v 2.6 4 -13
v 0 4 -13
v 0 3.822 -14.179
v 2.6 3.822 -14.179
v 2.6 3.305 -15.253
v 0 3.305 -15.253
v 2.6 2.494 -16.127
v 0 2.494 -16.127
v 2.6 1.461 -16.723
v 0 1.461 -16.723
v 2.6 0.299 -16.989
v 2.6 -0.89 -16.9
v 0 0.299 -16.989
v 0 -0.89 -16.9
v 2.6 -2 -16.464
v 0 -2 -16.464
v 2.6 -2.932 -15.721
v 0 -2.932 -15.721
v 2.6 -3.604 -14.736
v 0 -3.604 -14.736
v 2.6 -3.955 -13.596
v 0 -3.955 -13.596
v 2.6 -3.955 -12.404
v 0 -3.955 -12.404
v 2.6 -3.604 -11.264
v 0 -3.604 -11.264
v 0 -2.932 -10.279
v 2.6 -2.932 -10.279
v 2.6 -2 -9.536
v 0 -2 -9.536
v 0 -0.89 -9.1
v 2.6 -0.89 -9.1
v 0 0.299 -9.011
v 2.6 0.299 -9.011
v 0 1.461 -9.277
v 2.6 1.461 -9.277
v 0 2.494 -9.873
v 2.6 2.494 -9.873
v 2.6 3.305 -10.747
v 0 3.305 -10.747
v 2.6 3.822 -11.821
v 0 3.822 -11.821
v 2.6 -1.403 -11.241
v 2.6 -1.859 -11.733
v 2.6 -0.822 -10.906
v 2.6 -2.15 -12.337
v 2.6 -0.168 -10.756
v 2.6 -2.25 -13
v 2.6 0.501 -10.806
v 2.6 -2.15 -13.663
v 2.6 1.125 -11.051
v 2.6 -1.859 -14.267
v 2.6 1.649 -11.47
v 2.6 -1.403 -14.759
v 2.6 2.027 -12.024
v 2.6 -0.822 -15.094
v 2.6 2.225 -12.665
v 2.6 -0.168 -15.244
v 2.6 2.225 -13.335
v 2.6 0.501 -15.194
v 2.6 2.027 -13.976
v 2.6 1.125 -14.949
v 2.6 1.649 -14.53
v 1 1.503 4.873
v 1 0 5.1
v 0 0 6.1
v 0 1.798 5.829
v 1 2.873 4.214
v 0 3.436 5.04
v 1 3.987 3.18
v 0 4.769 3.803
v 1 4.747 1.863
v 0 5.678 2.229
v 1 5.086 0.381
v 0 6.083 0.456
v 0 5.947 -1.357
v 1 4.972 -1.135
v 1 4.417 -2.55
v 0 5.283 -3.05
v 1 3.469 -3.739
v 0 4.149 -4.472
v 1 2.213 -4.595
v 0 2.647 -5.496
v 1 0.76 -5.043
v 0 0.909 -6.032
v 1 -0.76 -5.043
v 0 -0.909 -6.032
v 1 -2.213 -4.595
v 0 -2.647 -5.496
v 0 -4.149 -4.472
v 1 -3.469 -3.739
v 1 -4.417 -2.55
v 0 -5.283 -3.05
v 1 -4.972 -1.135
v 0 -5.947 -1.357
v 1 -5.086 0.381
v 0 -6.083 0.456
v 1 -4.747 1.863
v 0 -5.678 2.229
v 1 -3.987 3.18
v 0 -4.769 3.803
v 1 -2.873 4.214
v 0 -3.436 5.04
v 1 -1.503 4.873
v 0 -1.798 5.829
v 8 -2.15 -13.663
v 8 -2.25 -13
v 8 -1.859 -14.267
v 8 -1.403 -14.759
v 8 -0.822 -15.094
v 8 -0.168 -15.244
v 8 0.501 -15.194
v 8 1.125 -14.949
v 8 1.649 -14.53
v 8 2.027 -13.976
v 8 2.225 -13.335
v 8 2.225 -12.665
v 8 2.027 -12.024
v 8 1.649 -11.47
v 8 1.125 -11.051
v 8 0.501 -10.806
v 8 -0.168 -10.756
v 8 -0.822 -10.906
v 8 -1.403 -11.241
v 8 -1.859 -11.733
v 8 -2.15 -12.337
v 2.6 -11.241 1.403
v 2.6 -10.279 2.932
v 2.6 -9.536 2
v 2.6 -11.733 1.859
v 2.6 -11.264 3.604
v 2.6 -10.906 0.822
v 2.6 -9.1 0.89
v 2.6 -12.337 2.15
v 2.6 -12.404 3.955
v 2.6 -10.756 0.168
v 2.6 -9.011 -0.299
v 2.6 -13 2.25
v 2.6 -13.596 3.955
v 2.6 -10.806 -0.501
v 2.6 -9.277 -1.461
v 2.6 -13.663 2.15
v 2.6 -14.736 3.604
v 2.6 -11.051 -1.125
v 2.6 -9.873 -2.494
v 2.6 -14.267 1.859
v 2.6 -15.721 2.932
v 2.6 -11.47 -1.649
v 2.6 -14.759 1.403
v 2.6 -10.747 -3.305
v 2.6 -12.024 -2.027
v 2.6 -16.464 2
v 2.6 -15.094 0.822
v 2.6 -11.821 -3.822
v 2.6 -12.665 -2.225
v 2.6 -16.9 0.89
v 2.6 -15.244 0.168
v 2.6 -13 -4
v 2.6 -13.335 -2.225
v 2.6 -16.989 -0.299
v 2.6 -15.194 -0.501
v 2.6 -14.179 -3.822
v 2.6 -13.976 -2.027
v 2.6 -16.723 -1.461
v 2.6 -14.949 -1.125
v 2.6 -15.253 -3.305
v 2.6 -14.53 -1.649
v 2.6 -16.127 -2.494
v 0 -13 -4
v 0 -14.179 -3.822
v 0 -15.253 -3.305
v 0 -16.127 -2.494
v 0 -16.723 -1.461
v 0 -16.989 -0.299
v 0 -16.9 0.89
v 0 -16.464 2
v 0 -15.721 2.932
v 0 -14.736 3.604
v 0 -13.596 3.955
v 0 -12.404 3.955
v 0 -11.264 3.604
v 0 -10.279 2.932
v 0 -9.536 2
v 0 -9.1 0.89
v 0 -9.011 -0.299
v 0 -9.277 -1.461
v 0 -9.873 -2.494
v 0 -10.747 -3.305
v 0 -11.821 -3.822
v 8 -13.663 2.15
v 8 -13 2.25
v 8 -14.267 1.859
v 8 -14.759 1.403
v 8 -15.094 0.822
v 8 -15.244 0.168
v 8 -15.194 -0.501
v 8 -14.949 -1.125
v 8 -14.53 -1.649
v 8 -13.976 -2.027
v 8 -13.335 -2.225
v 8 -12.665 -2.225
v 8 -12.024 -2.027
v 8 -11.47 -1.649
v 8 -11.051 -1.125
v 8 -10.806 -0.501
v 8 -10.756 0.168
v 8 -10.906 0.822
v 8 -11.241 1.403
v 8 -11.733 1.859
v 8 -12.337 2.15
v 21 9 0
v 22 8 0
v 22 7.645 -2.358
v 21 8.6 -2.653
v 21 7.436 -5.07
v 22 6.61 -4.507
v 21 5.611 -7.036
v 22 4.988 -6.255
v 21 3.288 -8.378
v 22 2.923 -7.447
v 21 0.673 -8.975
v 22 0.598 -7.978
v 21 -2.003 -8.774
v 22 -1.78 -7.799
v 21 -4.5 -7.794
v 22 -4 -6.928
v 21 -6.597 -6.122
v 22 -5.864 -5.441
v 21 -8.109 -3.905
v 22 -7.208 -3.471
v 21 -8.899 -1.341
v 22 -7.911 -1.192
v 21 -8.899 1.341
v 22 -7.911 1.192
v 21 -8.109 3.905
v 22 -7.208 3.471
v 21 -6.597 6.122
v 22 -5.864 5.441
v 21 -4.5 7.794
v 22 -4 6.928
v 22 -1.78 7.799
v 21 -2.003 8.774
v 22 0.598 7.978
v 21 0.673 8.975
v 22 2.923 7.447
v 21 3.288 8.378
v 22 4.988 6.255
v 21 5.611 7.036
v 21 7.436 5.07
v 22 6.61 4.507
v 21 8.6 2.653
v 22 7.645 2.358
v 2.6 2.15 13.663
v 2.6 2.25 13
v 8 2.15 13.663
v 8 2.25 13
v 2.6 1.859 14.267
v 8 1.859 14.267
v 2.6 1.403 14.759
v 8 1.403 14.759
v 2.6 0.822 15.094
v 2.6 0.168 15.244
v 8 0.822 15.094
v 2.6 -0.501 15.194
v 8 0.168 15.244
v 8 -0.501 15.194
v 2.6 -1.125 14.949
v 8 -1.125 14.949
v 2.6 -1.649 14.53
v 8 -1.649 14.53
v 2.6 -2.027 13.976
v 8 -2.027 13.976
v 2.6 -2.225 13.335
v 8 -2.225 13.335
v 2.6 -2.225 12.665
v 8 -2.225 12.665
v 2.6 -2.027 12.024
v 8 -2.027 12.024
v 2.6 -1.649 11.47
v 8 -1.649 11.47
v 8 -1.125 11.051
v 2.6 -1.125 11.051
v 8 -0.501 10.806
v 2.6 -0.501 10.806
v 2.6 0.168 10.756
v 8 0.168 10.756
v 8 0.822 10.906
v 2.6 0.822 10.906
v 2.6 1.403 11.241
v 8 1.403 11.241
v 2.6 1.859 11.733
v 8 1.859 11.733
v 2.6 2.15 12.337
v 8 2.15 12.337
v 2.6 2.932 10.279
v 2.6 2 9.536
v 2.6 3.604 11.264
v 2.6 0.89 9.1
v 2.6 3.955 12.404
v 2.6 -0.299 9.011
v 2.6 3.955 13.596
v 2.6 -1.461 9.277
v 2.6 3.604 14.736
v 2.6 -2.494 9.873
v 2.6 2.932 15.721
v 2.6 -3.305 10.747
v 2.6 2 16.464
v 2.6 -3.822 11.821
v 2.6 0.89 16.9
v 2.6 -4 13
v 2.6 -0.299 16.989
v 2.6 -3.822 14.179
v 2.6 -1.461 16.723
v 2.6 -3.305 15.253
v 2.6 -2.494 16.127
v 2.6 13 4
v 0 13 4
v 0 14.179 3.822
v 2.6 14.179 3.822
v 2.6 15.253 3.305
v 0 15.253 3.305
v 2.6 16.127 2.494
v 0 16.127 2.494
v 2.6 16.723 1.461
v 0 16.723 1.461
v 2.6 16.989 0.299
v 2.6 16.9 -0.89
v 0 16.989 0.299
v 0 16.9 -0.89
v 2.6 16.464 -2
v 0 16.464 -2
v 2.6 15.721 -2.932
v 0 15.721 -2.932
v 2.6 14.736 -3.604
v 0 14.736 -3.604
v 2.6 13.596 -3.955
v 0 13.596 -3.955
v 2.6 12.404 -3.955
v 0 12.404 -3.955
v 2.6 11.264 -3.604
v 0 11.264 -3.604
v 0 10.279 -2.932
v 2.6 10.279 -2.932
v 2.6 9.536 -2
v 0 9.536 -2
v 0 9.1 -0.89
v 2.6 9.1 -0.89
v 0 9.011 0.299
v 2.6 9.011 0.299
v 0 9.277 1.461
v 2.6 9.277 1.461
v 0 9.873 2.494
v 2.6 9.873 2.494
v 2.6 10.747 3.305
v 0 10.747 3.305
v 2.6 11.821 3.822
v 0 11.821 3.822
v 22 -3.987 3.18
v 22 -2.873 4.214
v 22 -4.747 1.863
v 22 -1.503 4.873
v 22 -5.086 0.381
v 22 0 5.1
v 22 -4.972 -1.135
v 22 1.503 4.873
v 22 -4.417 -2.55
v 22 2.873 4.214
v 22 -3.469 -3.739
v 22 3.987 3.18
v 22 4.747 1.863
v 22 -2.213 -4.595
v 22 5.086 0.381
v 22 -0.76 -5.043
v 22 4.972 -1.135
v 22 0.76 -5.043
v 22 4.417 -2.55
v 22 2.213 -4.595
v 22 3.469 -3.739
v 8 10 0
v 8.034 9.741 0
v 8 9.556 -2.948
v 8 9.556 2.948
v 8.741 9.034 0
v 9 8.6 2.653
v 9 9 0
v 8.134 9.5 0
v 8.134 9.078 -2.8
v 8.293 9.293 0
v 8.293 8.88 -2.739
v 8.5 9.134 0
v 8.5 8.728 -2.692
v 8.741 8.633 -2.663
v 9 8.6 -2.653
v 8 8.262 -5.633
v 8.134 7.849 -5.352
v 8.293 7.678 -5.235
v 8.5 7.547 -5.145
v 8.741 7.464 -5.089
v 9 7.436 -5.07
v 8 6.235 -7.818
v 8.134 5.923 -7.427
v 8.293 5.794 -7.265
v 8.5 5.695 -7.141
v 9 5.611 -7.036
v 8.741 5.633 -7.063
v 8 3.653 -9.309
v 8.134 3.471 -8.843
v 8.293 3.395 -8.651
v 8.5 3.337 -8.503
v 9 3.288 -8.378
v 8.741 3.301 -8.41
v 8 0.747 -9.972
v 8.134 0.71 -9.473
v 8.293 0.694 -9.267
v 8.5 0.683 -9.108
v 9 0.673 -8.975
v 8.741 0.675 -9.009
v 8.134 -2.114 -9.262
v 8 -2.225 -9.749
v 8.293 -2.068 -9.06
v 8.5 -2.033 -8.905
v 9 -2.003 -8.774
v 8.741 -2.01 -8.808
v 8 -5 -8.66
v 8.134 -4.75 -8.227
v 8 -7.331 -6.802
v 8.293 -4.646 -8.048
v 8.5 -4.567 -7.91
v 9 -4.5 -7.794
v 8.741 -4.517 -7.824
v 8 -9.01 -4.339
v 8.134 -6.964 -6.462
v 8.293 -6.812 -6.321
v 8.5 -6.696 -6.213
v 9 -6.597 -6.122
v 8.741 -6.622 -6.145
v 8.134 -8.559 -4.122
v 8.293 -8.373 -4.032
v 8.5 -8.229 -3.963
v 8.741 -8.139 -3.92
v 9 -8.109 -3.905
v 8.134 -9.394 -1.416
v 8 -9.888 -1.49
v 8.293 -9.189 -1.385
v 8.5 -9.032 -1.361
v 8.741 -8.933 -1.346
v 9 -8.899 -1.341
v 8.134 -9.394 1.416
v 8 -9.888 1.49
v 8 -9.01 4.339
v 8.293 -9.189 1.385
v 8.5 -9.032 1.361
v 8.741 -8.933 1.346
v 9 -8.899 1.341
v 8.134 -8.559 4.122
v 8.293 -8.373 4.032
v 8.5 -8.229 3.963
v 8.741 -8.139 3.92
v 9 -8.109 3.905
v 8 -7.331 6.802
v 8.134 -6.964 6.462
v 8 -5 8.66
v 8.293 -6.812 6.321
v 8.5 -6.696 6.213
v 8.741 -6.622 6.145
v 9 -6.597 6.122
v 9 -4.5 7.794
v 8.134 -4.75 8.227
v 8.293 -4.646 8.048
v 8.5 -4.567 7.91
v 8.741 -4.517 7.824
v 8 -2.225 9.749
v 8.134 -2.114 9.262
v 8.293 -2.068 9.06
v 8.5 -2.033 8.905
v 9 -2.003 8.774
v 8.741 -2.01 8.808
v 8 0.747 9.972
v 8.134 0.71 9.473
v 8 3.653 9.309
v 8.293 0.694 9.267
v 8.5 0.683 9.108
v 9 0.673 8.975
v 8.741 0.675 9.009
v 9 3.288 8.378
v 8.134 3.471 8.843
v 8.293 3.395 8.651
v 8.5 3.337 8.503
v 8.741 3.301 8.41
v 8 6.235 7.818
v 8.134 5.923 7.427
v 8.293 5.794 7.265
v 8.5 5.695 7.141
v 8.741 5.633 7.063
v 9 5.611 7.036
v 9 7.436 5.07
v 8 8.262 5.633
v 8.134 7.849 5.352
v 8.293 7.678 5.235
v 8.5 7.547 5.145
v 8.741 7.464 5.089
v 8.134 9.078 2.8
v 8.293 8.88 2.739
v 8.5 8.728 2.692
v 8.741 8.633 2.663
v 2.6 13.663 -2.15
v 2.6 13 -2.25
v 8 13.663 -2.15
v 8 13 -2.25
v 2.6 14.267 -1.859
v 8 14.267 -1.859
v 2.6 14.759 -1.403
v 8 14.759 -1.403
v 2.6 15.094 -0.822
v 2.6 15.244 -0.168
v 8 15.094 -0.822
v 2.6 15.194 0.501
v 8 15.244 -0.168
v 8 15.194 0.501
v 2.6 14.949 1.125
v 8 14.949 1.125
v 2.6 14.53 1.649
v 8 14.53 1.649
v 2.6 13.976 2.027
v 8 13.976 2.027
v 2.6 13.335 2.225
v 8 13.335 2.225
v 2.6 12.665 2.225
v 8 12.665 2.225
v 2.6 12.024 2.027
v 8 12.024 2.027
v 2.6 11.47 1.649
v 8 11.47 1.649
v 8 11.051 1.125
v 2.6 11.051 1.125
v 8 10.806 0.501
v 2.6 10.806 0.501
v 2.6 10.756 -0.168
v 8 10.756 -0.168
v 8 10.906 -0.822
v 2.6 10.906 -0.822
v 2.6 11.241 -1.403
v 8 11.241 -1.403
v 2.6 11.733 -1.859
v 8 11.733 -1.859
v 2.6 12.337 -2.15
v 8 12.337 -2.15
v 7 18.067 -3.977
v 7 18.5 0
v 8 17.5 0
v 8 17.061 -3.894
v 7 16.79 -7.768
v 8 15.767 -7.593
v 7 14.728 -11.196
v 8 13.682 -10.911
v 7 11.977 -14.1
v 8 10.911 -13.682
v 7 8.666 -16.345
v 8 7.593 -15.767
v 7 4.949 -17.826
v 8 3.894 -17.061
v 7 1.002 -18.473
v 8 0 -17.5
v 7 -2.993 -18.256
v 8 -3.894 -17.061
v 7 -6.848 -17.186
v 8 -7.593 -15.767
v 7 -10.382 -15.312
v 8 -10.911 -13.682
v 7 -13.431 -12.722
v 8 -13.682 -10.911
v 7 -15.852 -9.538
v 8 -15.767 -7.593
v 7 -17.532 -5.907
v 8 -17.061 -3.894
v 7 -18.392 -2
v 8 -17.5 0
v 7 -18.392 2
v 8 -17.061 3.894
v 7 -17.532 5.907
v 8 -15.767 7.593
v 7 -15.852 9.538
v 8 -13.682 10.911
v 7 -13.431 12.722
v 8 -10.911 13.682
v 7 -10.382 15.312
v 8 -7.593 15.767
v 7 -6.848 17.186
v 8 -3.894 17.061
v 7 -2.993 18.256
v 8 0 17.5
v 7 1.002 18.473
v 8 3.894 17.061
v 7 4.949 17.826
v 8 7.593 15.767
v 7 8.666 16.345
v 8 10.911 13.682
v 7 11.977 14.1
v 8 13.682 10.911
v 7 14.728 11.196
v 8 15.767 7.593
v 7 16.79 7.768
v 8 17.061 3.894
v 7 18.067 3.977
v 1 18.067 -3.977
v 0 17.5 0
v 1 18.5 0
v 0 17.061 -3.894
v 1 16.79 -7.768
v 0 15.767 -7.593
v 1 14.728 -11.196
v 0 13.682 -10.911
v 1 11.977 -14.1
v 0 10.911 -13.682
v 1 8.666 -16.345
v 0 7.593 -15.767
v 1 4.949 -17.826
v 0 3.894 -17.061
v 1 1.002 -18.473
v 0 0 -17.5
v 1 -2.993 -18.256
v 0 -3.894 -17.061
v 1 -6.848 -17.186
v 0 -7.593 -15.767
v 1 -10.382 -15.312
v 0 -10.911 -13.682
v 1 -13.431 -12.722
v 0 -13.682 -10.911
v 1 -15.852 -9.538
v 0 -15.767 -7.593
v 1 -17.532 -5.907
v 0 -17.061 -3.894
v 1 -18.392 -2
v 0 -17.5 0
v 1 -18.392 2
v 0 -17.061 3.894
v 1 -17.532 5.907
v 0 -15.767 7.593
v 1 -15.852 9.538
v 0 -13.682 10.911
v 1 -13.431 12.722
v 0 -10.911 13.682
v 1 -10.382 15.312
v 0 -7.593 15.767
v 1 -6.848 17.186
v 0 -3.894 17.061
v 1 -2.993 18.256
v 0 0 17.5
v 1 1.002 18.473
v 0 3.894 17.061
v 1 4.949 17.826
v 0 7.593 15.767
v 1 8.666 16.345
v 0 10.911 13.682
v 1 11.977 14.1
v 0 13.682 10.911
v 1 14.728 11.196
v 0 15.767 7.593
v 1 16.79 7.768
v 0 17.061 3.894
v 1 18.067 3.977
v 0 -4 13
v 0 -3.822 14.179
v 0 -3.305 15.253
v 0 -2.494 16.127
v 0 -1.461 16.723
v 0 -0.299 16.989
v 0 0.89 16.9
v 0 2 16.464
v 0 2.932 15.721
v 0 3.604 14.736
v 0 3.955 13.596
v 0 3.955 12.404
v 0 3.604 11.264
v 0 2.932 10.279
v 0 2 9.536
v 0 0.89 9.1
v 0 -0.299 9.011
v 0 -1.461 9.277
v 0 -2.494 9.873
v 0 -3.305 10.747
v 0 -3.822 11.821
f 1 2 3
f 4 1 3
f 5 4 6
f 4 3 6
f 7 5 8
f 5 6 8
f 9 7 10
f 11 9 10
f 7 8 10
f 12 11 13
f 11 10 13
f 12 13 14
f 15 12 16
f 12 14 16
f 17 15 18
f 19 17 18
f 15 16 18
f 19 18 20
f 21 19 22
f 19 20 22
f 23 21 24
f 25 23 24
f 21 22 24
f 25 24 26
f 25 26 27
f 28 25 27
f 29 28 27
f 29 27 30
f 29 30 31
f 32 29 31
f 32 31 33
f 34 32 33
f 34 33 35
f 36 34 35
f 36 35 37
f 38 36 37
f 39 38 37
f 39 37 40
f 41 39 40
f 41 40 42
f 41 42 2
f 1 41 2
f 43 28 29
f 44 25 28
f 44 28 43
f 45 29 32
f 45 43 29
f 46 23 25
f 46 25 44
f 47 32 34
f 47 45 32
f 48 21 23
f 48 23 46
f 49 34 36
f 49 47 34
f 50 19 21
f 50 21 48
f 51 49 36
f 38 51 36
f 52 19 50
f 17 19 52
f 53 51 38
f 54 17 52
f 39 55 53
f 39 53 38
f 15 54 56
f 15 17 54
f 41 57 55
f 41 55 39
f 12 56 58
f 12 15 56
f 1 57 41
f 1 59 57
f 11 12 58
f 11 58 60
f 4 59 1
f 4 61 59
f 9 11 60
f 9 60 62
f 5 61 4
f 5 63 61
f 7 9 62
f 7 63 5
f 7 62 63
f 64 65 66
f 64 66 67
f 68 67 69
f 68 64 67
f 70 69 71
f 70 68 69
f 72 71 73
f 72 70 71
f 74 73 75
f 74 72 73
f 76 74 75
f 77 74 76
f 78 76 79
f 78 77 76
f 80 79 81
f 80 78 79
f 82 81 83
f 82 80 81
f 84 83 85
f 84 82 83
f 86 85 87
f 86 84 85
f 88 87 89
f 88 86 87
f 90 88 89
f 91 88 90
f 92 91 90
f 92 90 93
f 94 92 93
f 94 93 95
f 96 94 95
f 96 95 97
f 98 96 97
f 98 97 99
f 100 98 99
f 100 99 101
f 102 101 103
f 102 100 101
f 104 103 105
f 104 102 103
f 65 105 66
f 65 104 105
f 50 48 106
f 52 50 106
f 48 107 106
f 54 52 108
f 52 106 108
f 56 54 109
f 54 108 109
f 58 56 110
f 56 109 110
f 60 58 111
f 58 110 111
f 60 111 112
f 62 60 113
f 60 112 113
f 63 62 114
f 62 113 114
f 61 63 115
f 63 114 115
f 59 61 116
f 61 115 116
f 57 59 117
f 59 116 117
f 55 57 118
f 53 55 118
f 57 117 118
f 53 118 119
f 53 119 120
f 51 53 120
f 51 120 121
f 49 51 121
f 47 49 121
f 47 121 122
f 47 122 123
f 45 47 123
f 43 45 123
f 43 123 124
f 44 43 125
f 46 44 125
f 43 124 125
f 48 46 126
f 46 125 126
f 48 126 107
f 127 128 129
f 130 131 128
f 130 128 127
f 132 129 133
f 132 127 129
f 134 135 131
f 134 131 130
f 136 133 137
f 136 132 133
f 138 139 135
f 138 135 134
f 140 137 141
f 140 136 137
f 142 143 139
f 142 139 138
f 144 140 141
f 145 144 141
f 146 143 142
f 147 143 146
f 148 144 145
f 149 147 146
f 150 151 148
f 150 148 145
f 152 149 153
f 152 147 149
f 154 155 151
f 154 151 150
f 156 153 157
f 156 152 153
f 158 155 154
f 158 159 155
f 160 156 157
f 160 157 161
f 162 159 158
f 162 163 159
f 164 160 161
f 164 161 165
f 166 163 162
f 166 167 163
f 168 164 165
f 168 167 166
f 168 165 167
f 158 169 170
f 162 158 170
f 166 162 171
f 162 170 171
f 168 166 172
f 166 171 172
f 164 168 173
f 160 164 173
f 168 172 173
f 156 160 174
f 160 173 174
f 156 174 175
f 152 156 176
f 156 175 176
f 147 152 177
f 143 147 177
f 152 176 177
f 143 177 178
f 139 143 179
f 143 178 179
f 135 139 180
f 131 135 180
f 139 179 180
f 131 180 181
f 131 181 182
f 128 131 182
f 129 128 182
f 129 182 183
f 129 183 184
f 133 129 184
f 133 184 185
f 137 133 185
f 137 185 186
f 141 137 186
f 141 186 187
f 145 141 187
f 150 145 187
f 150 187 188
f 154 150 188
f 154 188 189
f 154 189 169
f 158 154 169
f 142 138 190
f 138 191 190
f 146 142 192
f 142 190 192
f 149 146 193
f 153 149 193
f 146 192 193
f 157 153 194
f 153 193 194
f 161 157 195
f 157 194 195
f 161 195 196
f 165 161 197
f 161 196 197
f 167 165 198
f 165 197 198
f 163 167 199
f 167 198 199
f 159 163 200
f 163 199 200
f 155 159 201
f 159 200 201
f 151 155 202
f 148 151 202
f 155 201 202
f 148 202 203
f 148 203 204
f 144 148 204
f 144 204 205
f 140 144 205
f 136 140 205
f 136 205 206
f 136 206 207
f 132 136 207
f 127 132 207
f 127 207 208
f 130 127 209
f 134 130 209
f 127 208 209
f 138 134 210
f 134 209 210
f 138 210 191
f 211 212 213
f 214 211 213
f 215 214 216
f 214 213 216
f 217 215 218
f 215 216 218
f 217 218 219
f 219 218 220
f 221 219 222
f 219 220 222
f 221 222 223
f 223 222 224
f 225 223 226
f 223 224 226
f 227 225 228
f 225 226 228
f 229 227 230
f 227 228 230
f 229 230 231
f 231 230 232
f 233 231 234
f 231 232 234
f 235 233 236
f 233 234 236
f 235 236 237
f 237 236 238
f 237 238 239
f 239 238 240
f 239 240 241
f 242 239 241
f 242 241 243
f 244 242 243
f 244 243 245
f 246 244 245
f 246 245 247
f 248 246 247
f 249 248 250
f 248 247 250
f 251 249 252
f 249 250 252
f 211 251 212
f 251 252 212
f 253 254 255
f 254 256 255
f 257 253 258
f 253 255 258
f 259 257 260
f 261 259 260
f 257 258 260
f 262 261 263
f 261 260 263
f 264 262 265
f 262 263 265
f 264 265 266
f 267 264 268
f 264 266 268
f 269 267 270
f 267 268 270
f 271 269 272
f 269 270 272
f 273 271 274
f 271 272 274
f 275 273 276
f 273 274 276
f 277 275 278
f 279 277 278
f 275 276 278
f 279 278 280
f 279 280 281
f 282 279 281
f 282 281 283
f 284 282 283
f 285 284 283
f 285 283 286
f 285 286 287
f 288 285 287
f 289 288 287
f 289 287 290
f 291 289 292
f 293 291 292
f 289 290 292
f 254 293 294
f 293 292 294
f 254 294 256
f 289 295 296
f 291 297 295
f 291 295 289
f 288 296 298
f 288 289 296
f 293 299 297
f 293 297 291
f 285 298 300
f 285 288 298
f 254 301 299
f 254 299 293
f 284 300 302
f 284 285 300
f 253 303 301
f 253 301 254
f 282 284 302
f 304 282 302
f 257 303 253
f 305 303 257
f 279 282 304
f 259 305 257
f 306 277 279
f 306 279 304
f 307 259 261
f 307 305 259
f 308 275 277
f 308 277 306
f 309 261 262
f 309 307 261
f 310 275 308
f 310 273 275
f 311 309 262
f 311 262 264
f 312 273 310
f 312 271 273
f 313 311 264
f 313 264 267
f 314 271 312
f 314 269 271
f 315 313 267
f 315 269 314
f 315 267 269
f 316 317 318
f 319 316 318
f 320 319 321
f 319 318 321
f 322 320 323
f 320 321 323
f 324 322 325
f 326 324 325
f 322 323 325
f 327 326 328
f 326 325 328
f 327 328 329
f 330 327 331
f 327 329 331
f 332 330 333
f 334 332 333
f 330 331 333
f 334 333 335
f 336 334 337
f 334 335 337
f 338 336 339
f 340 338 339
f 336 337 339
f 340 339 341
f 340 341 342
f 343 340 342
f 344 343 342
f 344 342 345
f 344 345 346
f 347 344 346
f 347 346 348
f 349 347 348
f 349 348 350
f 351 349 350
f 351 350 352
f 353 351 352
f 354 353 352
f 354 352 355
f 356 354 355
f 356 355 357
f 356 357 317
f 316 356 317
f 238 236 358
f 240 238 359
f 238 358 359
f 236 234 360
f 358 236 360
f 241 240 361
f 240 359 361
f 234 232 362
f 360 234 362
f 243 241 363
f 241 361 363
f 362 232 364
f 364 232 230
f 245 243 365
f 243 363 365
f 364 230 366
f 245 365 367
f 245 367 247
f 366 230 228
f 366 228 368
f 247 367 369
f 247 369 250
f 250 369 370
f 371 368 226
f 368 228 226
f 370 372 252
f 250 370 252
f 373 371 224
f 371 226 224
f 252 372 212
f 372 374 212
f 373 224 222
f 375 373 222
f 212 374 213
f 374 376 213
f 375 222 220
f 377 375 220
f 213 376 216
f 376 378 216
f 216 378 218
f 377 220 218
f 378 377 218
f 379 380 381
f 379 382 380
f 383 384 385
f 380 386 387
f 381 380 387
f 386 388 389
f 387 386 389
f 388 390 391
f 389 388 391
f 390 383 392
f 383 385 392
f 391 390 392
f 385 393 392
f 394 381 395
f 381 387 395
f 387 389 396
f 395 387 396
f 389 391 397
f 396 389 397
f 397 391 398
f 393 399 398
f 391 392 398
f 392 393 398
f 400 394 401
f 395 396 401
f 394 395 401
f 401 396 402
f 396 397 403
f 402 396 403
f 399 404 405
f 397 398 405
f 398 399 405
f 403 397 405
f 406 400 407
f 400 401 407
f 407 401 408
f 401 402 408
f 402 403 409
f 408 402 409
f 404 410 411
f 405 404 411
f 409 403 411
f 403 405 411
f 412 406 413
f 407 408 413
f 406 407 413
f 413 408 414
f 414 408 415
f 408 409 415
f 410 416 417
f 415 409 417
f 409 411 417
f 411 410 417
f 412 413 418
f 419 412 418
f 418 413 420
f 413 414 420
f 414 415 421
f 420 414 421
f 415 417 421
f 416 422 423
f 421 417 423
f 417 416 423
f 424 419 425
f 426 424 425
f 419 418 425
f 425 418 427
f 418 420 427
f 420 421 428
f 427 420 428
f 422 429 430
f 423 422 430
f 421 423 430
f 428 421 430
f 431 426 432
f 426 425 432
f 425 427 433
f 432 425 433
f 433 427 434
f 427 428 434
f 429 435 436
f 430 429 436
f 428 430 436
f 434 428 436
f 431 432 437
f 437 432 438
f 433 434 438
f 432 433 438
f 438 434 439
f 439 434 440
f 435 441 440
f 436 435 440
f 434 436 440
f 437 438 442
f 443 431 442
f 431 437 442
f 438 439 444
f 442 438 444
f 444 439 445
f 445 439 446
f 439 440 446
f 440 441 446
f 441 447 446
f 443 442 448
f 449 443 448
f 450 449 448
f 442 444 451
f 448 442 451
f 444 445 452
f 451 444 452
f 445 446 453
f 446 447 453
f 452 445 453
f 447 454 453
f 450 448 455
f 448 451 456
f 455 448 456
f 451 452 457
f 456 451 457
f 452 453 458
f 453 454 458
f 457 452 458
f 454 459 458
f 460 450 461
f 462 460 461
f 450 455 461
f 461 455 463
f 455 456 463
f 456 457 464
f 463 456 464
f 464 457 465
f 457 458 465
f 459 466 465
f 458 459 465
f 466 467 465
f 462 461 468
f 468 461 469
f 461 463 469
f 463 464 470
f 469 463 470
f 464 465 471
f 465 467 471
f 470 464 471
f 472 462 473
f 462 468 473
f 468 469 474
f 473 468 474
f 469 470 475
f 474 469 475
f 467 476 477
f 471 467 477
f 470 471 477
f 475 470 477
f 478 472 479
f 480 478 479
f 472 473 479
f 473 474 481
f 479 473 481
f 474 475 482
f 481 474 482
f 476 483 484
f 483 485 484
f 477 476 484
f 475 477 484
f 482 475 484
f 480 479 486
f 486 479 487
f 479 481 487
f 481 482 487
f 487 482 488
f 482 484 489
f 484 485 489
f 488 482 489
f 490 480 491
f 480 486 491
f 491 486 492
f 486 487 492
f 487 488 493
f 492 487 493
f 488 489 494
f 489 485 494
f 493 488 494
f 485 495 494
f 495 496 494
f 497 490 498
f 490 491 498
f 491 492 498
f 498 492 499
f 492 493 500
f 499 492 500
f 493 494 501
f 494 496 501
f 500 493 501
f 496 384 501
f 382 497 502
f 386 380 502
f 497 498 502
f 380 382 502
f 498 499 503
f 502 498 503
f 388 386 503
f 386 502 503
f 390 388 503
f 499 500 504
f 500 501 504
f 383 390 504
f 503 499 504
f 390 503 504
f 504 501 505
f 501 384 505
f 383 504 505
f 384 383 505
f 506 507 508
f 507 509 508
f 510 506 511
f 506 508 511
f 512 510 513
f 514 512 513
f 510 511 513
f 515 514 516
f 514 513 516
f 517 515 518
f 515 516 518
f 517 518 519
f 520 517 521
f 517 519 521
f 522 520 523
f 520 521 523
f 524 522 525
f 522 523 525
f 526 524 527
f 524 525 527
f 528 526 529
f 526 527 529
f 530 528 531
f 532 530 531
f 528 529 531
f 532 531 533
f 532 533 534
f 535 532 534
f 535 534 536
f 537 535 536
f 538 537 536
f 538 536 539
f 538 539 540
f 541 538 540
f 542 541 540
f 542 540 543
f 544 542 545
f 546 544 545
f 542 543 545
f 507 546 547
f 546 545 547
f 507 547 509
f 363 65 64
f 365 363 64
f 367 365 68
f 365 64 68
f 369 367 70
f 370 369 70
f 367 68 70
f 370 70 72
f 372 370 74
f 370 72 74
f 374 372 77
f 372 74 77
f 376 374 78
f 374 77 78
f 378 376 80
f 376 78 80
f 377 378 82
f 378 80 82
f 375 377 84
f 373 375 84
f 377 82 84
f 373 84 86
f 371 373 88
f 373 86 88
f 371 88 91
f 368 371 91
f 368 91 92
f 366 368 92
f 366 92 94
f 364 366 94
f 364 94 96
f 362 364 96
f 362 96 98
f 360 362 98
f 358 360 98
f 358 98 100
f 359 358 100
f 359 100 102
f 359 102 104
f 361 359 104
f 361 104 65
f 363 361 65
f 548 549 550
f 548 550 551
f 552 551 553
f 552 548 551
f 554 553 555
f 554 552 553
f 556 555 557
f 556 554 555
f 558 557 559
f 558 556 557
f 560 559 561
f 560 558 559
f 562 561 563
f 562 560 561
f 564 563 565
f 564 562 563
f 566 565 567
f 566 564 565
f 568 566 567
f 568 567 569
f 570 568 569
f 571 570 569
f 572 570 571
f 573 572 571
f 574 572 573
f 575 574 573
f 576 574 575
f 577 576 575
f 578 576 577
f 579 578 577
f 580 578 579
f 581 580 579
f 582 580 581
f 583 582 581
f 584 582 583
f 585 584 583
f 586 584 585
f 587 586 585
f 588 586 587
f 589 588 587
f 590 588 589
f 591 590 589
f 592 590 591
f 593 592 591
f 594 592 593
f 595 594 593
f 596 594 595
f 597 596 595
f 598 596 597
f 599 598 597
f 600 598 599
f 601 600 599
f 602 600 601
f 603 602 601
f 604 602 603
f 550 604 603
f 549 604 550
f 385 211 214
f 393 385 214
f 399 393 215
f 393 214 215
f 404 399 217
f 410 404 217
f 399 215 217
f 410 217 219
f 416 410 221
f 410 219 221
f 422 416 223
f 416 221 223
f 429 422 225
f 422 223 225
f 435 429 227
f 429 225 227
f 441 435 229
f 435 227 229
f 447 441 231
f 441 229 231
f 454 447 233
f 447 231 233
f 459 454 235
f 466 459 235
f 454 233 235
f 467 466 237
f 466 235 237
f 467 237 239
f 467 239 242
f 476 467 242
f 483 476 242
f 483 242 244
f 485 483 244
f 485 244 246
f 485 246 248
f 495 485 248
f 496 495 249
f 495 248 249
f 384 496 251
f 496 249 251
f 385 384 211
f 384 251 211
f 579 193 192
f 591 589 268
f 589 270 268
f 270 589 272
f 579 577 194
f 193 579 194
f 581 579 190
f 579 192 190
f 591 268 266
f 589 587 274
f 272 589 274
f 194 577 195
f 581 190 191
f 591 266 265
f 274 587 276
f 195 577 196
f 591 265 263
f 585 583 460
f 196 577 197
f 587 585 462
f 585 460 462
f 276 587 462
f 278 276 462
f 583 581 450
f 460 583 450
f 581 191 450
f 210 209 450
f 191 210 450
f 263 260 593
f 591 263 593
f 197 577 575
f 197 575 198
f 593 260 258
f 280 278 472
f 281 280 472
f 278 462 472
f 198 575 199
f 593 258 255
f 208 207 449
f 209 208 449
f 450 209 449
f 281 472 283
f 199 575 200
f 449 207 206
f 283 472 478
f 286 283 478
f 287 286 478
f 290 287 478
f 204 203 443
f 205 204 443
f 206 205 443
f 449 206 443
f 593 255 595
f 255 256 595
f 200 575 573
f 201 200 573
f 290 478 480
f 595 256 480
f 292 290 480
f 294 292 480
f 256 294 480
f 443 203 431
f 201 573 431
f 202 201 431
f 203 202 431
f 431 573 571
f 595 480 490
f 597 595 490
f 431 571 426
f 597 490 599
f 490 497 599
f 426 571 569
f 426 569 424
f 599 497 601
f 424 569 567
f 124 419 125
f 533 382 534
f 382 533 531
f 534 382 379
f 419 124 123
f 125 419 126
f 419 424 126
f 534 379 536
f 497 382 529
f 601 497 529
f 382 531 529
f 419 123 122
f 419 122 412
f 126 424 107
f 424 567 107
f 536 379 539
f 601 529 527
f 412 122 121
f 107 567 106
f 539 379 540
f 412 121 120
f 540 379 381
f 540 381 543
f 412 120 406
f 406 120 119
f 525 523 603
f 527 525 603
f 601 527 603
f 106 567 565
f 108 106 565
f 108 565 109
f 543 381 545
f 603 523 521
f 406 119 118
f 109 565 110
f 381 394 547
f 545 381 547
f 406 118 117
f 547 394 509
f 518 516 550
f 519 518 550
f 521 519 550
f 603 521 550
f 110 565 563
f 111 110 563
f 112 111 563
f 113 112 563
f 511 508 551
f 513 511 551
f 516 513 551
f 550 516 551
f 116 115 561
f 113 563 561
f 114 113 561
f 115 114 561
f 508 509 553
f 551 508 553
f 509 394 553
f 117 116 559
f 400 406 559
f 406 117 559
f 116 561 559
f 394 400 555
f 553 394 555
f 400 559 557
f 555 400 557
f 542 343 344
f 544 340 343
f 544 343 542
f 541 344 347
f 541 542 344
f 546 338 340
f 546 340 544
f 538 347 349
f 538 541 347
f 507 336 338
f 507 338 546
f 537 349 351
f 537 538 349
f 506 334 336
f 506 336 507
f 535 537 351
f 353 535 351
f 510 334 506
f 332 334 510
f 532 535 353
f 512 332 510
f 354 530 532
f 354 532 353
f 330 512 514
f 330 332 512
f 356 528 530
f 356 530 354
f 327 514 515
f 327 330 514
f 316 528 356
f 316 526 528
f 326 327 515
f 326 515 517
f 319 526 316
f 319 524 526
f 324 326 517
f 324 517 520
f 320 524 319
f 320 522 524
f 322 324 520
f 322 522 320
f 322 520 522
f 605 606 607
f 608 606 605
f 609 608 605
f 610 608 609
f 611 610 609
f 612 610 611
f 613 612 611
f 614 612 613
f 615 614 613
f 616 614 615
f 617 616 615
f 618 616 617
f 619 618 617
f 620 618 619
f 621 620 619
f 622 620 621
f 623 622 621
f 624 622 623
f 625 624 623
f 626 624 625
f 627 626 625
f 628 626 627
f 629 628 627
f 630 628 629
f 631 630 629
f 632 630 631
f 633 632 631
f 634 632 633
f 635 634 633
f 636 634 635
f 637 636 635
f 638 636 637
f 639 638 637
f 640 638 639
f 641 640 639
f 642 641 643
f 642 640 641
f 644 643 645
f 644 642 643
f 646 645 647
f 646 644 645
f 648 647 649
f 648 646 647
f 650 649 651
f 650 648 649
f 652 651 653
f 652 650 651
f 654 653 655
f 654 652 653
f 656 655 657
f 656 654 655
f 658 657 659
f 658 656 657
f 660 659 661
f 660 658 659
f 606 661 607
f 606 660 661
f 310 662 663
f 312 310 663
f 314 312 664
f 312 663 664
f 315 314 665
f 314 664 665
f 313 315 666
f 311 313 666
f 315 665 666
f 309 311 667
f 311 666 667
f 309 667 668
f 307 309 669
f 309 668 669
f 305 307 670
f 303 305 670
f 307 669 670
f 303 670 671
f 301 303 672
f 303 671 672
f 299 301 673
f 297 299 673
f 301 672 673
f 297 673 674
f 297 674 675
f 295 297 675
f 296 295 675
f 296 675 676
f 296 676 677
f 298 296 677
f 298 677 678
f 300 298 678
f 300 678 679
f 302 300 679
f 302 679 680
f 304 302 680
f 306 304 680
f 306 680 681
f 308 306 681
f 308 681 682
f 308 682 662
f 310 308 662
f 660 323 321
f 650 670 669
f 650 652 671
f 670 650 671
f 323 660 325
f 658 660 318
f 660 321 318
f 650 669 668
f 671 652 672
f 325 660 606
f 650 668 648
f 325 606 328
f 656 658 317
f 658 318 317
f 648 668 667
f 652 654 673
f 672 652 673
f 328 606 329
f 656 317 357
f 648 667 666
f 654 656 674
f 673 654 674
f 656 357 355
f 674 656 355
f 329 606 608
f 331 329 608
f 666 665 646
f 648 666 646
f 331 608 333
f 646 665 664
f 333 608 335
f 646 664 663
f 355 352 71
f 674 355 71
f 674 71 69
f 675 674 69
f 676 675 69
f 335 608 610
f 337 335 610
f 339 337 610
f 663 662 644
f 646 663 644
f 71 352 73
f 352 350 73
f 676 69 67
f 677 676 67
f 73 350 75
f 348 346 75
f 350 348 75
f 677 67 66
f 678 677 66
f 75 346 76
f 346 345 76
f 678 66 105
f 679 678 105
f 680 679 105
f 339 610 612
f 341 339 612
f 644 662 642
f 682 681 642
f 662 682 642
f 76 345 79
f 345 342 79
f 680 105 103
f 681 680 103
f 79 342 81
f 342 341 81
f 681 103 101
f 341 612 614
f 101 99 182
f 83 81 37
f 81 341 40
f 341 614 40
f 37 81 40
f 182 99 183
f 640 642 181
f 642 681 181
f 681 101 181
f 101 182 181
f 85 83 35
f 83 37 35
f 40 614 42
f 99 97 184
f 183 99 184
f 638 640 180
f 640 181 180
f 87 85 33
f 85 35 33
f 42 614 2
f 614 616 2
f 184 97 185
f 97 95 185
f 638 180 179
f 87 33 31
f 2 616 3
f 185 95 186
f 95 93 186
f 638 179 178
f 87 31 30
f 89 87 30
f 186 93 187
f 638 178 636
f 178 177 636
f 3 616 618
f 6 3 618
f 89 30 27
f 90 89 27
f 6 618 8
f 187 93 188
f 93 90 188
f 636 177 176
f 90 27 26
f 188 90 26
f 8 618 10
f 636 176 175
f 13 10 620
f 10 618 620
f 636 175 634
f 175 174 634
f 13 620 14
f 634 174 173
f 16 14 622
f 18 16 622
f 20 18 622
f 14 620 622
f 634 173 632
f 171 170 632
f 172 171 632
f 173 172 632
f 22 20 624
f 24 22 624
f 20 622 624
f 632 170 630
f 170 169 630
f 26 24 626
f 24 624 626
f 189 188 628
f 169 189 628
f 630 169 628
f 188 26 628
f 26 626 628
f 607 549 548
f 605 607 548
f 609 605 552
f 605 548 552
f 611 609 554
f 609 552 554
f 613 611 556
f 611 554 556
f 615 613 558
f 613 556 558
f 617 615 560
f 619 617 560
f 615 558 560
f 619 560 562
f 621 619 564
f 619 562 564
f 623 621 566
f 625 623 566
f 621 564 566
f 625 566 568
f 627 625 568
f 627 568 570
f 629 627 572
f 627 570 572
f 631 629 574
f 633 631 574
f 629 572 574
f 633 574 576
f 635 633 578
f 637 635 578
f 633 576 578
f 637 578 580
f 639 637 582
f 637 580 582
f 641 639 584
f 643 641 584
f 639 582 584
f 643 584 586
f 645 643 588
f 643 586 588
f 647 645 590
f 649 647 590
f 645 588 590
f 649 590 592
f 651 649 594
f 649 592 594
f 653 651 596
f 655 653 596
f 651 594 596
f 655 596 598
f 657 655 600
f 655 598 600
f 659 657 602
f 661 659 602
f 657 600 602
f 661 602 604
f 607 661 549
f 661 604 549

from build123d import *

# Parameters (mm, degrees)
FORO_LAMATO_PER_VITE_M4_A_TESTA_CILINDRI_D           = 4.5
FORO_LAMATO_PER_VITE_M4_A_TESTA_CILINDRI_CBORE_D     = 8
FORO_LAMATO_PER_VITE_M4_A_TESTA_CILINDRI_CBORE_DEPTH = 2.6
RIPETIZIONECIRCOLARE1_COUNT                          = 4
RACCORDO1_R                                          = 1
SMUSSO1_SIZE                                         = 1
FORO_FILETTATO_M12_1_D                               = 10.2
FORO_FILETTATO_M12_1_DEPTH                           = 32.75
FORO_FILETTATO_M12_1_TIP                             = 3.064389157
SMUSSO2_SIZE                                         = 1


with BuildPart() as part:
    # Schizzo1 → Rivoluzione1 (revolve)
    with BuildSketch(Plane.XY):
        Polygon((0, 0), (0, 18.5), (8, 18.5), (8, 9), (22, 9), (22, 0), align=None)
    revolve(axis=Axis((22, 0, 0), (-1, 0, 0)))

    # Foro lamato per Vite M4 a testa cilindrica piana-1 (through all)
    with Locations(Plane.ZY):
        with Locations((0, 13)):
            foro_lamato_per_vite_m4_a_testa_cilindri = CounterBoreHole(FORO_LAMATO_PER_VITE_M4_A_TESTA_CILINDRI_D / 2, FORO_LAMATO_PER_VITE_M4_A_TESTA_CILINDRI_CBORE_D / 2, FORO_LAMATO_PER_VITE_M4_A_TESTA_CILINDRI_CBORE_DEPTH)

    # RipetizioneCircolare1: Foro lamato per Vite M4 a testa cilindrica piana-1 ×4 about axis
    ripetizionecircolare1_axis = Axis((0, 0, 0), (1, 0, 0))
    for i in range(1, RIPETIZIONECIRCOLARE1_COUNT):
        add(foro_lamato_per_vite_m4_a_testa_cilindri.rotate(ripetizionecircolare1_axis, i * 360 / RIPETIZIONECIRCOLARE1_COUNT), mode=Mode.SUBTRACT)

    # Raccordo1
    raccordo1_edges = [part.edges().sort_by_distance(p)[0] for p in [
        (8, -9, 0),
    ]]
    fillet(raccordo1_edges, radius=RACCORDO1_R)

    # Smusso1
    smusso1_edges = [part.edges().sort_by_distance(p)[0] for p in [
        (22, -9, 0),
        (8, -18.5, 0),
        (0, -18.5, 0),
    ]]
    chamfer(smusso1_edges, length=SMUSSO1_SIZE)

    # Foro filettato M12-1
    with Locations(Plane(origin=(22, 0, 0), x_dir=(0, 0, -1), z_dir=(1, 0, 0))):
        with Locations((0, 0)):
            Hole(FORO_FILETTATO_M12_1_D / 2, depth=FORO_FILETTATO_M12_1_DEPTH)
            with Locations((0, 0, -(FORO_FILETTATO_M12_1_DEPTH + FORO_FILETTATO_M12_1_TIP / 2))):  # 118° drill point
                Cone(0, FORO_FILETTATO_M12_1_D / 2, FORO_FILETTATO_M12_1_TIP, mode=Mode.SUBTRACT)

    # Smusso2
    smusso2_edges = [part.edges().sort_by_distance(p)[0] for p in [
        (0, 0, -5.1),
    ]]
    chamfer(smusso2_edges, length=SMUSSO2_SIZE)


solid = part.part
